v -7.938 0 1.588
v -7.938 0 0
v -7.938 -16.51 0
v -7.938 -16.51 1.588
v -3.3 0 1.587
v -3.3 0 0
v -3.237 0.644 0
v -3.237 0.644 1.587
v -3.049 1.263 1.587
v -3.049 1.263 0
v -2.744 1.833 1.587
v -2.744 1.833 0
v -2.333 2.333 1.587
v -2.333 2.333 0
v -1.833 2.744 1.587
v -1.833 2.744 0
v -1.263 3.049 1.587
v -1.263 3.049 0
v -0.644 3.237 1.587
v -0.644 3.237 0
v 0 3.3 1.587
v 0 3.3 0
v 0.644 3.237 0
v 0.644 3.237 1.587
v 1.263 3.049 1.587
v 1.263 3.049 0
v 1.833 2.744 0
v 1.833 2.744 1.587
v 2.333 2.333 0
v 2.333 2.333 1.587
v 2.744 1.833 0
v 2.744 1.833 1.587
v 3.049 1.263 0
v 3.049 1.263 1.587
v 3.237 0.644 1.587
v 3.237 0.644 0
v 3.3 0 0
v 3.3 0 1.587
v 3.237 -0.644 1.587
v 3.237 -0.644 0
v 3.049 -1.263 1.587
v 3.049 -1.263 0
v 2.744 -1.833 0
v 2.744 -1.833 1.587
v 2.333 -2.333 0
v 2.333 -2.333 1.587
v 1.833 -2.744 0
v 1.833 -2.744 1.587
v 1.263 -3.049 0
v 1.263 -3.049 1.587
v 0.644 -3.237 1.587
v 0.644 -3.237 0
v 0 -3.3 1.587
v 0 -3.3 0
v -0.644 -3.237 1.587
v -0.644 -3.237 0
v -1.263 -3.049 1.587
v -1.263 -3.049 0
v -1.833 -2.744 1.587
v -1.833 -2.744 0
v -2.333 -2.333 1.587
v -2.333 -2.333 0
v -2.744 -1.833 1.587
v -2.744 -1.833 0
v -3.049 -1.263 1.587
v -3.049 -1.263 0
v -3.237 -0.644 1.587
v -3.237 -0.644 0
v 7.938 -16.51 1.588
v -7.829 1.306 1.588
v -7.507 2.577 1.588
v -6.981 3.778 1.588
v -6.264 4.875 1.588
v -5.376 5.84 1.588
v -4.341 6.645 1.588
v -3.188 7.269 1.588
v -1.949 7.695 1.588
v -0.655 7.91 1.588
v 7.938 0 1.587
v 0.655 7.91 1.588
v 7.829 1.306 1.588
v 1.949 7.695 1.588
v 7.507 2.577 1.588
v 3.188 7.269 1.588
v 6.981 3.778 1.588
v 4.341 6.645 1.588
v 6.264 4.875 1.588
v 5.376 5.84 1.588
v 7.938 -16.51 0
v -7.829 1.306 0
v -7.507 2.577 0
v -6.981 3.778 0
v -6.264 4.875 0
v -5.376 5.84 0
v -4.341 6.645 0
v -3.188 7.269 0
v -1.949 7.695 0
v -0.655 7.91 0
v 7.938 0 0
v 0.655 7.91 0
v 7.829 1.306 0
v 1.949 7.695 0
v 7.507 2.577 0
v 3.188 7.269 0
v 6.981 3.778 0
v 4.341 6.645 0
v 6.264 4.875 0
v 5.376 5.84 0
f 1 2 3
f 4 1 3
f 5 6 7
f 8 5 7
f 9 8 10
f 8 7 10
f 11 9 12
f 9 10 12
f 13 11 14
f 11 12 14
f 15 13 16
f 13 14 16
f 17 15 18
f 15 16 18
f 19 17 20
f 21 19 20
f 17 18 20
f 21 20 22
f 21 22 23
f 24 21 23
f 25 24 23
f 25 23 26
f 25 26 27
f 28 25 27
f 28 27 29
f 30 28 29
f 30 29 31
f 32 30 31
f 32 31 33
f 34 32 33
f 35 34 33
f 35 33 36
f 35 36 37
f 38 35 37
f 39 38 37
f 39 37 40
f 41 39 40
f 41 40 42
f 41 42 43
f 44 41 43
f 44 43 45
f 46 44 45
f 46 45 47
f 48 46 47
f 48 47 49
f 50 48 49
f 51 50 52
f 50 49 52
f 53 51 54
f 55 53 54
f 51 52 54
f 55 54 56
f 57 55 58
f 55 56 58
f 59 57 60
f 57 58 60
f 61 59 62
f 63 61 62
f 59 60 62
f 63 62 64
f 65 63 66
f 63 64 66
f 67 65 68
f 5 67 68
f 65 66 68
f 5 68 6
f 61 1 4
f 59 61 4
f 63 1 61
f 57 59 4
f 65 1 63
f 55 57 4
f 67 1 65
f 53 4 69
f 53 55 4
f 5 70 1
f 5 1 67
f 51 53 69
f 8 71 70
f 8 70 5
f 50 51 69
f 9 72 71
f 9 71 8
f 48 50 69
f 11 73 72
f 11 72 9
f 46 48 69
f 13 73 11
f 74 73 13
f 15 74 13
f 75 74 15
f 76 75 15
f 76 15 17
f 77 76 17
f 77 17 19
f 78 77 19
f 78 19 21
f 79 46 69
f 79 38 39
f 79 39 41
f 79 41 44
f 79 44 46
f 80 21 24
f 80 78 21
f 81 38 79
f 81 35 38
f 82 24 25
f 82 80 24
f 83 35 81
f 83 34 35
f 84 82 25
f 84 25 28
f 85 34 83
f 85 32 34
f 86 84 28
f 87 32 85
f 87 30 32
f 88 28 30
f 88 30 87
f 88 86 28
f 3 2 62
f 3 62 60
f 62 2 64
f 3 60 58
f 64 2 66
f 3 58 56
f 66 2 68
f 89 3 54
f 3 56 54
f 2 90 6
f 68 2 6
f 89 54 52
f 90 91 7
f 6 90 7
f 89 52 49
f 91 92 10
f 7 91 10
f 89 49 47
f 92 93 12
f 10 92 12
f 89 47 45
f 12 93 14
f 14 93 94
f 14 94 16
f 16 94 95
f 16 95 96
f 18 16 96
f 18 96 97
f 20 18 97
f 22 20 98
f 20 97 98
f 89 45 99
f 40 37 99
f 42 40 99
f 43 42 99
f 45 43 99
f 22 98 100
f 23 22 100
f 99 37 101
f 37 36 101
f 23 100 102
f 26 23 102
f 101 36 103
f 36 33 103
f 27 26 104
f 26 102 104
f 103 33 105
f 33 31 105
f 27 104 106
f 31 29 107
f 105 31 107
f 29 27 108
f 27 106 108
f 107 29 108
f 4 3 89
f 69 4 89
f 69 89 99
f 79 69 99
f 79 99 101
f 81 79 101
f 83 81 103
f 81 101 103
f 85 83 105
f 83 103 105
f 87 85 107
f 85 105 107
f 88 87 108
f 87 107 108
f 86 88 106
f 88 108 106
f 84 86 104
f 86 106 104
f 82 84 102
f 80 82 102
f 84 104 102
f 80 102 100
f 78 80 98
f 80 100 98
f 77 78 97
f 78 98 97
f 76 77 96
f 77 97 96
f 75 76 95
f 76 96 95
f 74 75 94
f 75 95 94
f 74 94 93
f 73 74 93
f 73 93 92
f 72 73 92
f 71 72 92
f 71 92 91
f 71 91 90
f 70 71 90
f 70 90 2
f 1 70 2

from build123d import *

# Parameters (mm, degrees)
SKETCH1_R            = 7.9375
SKETCH1_R_2          = 3
BOSS_EXTRUDE1_DEPTH  = 1.5875
M6_CLEARANCE_HOLE1_D = 6.6


with BuildPart() as part:
    # Sketch1 → Boss-Extrude1 (new body)
    # profile 1 of 3: a face of its own
    with BuildSketch(Plane.XY):
        Circle(SKETCH1_R)
        Circle(SKETCH1_R_2, mode=Mode.SUBTRACT)
    # profile 2 of 3: a face of its own
    with BuildSketch(Plane.XY):
        with BuildLine():
            ThreePointArc((7.9375, 0), (0, -7.9375), (-7.9375, 0))
            Line((-7.9375, 0), (-7.9375, -16.51))
            Line((-7.9375, -16.51), (7.9375, -16.51))
            Line((7.9375, -16.51), (7.9375, 0))
        make_face()
    # profile 3 of 3: a face of its own
    with BuildSketch(Plane.XY):
        Circle(SKETCH1_R_2)
    extrude(amount=BOSS_EXTRUDE1_DEPTH)

    # M6 Clearance Hole1 (through all)
    with Locations(Plane.XY.offset(1.5875)):
        with Locations((0, 0)):
            Hole(M6_CLEARANCE_HOLE1_D / 2)


solid = part.part
